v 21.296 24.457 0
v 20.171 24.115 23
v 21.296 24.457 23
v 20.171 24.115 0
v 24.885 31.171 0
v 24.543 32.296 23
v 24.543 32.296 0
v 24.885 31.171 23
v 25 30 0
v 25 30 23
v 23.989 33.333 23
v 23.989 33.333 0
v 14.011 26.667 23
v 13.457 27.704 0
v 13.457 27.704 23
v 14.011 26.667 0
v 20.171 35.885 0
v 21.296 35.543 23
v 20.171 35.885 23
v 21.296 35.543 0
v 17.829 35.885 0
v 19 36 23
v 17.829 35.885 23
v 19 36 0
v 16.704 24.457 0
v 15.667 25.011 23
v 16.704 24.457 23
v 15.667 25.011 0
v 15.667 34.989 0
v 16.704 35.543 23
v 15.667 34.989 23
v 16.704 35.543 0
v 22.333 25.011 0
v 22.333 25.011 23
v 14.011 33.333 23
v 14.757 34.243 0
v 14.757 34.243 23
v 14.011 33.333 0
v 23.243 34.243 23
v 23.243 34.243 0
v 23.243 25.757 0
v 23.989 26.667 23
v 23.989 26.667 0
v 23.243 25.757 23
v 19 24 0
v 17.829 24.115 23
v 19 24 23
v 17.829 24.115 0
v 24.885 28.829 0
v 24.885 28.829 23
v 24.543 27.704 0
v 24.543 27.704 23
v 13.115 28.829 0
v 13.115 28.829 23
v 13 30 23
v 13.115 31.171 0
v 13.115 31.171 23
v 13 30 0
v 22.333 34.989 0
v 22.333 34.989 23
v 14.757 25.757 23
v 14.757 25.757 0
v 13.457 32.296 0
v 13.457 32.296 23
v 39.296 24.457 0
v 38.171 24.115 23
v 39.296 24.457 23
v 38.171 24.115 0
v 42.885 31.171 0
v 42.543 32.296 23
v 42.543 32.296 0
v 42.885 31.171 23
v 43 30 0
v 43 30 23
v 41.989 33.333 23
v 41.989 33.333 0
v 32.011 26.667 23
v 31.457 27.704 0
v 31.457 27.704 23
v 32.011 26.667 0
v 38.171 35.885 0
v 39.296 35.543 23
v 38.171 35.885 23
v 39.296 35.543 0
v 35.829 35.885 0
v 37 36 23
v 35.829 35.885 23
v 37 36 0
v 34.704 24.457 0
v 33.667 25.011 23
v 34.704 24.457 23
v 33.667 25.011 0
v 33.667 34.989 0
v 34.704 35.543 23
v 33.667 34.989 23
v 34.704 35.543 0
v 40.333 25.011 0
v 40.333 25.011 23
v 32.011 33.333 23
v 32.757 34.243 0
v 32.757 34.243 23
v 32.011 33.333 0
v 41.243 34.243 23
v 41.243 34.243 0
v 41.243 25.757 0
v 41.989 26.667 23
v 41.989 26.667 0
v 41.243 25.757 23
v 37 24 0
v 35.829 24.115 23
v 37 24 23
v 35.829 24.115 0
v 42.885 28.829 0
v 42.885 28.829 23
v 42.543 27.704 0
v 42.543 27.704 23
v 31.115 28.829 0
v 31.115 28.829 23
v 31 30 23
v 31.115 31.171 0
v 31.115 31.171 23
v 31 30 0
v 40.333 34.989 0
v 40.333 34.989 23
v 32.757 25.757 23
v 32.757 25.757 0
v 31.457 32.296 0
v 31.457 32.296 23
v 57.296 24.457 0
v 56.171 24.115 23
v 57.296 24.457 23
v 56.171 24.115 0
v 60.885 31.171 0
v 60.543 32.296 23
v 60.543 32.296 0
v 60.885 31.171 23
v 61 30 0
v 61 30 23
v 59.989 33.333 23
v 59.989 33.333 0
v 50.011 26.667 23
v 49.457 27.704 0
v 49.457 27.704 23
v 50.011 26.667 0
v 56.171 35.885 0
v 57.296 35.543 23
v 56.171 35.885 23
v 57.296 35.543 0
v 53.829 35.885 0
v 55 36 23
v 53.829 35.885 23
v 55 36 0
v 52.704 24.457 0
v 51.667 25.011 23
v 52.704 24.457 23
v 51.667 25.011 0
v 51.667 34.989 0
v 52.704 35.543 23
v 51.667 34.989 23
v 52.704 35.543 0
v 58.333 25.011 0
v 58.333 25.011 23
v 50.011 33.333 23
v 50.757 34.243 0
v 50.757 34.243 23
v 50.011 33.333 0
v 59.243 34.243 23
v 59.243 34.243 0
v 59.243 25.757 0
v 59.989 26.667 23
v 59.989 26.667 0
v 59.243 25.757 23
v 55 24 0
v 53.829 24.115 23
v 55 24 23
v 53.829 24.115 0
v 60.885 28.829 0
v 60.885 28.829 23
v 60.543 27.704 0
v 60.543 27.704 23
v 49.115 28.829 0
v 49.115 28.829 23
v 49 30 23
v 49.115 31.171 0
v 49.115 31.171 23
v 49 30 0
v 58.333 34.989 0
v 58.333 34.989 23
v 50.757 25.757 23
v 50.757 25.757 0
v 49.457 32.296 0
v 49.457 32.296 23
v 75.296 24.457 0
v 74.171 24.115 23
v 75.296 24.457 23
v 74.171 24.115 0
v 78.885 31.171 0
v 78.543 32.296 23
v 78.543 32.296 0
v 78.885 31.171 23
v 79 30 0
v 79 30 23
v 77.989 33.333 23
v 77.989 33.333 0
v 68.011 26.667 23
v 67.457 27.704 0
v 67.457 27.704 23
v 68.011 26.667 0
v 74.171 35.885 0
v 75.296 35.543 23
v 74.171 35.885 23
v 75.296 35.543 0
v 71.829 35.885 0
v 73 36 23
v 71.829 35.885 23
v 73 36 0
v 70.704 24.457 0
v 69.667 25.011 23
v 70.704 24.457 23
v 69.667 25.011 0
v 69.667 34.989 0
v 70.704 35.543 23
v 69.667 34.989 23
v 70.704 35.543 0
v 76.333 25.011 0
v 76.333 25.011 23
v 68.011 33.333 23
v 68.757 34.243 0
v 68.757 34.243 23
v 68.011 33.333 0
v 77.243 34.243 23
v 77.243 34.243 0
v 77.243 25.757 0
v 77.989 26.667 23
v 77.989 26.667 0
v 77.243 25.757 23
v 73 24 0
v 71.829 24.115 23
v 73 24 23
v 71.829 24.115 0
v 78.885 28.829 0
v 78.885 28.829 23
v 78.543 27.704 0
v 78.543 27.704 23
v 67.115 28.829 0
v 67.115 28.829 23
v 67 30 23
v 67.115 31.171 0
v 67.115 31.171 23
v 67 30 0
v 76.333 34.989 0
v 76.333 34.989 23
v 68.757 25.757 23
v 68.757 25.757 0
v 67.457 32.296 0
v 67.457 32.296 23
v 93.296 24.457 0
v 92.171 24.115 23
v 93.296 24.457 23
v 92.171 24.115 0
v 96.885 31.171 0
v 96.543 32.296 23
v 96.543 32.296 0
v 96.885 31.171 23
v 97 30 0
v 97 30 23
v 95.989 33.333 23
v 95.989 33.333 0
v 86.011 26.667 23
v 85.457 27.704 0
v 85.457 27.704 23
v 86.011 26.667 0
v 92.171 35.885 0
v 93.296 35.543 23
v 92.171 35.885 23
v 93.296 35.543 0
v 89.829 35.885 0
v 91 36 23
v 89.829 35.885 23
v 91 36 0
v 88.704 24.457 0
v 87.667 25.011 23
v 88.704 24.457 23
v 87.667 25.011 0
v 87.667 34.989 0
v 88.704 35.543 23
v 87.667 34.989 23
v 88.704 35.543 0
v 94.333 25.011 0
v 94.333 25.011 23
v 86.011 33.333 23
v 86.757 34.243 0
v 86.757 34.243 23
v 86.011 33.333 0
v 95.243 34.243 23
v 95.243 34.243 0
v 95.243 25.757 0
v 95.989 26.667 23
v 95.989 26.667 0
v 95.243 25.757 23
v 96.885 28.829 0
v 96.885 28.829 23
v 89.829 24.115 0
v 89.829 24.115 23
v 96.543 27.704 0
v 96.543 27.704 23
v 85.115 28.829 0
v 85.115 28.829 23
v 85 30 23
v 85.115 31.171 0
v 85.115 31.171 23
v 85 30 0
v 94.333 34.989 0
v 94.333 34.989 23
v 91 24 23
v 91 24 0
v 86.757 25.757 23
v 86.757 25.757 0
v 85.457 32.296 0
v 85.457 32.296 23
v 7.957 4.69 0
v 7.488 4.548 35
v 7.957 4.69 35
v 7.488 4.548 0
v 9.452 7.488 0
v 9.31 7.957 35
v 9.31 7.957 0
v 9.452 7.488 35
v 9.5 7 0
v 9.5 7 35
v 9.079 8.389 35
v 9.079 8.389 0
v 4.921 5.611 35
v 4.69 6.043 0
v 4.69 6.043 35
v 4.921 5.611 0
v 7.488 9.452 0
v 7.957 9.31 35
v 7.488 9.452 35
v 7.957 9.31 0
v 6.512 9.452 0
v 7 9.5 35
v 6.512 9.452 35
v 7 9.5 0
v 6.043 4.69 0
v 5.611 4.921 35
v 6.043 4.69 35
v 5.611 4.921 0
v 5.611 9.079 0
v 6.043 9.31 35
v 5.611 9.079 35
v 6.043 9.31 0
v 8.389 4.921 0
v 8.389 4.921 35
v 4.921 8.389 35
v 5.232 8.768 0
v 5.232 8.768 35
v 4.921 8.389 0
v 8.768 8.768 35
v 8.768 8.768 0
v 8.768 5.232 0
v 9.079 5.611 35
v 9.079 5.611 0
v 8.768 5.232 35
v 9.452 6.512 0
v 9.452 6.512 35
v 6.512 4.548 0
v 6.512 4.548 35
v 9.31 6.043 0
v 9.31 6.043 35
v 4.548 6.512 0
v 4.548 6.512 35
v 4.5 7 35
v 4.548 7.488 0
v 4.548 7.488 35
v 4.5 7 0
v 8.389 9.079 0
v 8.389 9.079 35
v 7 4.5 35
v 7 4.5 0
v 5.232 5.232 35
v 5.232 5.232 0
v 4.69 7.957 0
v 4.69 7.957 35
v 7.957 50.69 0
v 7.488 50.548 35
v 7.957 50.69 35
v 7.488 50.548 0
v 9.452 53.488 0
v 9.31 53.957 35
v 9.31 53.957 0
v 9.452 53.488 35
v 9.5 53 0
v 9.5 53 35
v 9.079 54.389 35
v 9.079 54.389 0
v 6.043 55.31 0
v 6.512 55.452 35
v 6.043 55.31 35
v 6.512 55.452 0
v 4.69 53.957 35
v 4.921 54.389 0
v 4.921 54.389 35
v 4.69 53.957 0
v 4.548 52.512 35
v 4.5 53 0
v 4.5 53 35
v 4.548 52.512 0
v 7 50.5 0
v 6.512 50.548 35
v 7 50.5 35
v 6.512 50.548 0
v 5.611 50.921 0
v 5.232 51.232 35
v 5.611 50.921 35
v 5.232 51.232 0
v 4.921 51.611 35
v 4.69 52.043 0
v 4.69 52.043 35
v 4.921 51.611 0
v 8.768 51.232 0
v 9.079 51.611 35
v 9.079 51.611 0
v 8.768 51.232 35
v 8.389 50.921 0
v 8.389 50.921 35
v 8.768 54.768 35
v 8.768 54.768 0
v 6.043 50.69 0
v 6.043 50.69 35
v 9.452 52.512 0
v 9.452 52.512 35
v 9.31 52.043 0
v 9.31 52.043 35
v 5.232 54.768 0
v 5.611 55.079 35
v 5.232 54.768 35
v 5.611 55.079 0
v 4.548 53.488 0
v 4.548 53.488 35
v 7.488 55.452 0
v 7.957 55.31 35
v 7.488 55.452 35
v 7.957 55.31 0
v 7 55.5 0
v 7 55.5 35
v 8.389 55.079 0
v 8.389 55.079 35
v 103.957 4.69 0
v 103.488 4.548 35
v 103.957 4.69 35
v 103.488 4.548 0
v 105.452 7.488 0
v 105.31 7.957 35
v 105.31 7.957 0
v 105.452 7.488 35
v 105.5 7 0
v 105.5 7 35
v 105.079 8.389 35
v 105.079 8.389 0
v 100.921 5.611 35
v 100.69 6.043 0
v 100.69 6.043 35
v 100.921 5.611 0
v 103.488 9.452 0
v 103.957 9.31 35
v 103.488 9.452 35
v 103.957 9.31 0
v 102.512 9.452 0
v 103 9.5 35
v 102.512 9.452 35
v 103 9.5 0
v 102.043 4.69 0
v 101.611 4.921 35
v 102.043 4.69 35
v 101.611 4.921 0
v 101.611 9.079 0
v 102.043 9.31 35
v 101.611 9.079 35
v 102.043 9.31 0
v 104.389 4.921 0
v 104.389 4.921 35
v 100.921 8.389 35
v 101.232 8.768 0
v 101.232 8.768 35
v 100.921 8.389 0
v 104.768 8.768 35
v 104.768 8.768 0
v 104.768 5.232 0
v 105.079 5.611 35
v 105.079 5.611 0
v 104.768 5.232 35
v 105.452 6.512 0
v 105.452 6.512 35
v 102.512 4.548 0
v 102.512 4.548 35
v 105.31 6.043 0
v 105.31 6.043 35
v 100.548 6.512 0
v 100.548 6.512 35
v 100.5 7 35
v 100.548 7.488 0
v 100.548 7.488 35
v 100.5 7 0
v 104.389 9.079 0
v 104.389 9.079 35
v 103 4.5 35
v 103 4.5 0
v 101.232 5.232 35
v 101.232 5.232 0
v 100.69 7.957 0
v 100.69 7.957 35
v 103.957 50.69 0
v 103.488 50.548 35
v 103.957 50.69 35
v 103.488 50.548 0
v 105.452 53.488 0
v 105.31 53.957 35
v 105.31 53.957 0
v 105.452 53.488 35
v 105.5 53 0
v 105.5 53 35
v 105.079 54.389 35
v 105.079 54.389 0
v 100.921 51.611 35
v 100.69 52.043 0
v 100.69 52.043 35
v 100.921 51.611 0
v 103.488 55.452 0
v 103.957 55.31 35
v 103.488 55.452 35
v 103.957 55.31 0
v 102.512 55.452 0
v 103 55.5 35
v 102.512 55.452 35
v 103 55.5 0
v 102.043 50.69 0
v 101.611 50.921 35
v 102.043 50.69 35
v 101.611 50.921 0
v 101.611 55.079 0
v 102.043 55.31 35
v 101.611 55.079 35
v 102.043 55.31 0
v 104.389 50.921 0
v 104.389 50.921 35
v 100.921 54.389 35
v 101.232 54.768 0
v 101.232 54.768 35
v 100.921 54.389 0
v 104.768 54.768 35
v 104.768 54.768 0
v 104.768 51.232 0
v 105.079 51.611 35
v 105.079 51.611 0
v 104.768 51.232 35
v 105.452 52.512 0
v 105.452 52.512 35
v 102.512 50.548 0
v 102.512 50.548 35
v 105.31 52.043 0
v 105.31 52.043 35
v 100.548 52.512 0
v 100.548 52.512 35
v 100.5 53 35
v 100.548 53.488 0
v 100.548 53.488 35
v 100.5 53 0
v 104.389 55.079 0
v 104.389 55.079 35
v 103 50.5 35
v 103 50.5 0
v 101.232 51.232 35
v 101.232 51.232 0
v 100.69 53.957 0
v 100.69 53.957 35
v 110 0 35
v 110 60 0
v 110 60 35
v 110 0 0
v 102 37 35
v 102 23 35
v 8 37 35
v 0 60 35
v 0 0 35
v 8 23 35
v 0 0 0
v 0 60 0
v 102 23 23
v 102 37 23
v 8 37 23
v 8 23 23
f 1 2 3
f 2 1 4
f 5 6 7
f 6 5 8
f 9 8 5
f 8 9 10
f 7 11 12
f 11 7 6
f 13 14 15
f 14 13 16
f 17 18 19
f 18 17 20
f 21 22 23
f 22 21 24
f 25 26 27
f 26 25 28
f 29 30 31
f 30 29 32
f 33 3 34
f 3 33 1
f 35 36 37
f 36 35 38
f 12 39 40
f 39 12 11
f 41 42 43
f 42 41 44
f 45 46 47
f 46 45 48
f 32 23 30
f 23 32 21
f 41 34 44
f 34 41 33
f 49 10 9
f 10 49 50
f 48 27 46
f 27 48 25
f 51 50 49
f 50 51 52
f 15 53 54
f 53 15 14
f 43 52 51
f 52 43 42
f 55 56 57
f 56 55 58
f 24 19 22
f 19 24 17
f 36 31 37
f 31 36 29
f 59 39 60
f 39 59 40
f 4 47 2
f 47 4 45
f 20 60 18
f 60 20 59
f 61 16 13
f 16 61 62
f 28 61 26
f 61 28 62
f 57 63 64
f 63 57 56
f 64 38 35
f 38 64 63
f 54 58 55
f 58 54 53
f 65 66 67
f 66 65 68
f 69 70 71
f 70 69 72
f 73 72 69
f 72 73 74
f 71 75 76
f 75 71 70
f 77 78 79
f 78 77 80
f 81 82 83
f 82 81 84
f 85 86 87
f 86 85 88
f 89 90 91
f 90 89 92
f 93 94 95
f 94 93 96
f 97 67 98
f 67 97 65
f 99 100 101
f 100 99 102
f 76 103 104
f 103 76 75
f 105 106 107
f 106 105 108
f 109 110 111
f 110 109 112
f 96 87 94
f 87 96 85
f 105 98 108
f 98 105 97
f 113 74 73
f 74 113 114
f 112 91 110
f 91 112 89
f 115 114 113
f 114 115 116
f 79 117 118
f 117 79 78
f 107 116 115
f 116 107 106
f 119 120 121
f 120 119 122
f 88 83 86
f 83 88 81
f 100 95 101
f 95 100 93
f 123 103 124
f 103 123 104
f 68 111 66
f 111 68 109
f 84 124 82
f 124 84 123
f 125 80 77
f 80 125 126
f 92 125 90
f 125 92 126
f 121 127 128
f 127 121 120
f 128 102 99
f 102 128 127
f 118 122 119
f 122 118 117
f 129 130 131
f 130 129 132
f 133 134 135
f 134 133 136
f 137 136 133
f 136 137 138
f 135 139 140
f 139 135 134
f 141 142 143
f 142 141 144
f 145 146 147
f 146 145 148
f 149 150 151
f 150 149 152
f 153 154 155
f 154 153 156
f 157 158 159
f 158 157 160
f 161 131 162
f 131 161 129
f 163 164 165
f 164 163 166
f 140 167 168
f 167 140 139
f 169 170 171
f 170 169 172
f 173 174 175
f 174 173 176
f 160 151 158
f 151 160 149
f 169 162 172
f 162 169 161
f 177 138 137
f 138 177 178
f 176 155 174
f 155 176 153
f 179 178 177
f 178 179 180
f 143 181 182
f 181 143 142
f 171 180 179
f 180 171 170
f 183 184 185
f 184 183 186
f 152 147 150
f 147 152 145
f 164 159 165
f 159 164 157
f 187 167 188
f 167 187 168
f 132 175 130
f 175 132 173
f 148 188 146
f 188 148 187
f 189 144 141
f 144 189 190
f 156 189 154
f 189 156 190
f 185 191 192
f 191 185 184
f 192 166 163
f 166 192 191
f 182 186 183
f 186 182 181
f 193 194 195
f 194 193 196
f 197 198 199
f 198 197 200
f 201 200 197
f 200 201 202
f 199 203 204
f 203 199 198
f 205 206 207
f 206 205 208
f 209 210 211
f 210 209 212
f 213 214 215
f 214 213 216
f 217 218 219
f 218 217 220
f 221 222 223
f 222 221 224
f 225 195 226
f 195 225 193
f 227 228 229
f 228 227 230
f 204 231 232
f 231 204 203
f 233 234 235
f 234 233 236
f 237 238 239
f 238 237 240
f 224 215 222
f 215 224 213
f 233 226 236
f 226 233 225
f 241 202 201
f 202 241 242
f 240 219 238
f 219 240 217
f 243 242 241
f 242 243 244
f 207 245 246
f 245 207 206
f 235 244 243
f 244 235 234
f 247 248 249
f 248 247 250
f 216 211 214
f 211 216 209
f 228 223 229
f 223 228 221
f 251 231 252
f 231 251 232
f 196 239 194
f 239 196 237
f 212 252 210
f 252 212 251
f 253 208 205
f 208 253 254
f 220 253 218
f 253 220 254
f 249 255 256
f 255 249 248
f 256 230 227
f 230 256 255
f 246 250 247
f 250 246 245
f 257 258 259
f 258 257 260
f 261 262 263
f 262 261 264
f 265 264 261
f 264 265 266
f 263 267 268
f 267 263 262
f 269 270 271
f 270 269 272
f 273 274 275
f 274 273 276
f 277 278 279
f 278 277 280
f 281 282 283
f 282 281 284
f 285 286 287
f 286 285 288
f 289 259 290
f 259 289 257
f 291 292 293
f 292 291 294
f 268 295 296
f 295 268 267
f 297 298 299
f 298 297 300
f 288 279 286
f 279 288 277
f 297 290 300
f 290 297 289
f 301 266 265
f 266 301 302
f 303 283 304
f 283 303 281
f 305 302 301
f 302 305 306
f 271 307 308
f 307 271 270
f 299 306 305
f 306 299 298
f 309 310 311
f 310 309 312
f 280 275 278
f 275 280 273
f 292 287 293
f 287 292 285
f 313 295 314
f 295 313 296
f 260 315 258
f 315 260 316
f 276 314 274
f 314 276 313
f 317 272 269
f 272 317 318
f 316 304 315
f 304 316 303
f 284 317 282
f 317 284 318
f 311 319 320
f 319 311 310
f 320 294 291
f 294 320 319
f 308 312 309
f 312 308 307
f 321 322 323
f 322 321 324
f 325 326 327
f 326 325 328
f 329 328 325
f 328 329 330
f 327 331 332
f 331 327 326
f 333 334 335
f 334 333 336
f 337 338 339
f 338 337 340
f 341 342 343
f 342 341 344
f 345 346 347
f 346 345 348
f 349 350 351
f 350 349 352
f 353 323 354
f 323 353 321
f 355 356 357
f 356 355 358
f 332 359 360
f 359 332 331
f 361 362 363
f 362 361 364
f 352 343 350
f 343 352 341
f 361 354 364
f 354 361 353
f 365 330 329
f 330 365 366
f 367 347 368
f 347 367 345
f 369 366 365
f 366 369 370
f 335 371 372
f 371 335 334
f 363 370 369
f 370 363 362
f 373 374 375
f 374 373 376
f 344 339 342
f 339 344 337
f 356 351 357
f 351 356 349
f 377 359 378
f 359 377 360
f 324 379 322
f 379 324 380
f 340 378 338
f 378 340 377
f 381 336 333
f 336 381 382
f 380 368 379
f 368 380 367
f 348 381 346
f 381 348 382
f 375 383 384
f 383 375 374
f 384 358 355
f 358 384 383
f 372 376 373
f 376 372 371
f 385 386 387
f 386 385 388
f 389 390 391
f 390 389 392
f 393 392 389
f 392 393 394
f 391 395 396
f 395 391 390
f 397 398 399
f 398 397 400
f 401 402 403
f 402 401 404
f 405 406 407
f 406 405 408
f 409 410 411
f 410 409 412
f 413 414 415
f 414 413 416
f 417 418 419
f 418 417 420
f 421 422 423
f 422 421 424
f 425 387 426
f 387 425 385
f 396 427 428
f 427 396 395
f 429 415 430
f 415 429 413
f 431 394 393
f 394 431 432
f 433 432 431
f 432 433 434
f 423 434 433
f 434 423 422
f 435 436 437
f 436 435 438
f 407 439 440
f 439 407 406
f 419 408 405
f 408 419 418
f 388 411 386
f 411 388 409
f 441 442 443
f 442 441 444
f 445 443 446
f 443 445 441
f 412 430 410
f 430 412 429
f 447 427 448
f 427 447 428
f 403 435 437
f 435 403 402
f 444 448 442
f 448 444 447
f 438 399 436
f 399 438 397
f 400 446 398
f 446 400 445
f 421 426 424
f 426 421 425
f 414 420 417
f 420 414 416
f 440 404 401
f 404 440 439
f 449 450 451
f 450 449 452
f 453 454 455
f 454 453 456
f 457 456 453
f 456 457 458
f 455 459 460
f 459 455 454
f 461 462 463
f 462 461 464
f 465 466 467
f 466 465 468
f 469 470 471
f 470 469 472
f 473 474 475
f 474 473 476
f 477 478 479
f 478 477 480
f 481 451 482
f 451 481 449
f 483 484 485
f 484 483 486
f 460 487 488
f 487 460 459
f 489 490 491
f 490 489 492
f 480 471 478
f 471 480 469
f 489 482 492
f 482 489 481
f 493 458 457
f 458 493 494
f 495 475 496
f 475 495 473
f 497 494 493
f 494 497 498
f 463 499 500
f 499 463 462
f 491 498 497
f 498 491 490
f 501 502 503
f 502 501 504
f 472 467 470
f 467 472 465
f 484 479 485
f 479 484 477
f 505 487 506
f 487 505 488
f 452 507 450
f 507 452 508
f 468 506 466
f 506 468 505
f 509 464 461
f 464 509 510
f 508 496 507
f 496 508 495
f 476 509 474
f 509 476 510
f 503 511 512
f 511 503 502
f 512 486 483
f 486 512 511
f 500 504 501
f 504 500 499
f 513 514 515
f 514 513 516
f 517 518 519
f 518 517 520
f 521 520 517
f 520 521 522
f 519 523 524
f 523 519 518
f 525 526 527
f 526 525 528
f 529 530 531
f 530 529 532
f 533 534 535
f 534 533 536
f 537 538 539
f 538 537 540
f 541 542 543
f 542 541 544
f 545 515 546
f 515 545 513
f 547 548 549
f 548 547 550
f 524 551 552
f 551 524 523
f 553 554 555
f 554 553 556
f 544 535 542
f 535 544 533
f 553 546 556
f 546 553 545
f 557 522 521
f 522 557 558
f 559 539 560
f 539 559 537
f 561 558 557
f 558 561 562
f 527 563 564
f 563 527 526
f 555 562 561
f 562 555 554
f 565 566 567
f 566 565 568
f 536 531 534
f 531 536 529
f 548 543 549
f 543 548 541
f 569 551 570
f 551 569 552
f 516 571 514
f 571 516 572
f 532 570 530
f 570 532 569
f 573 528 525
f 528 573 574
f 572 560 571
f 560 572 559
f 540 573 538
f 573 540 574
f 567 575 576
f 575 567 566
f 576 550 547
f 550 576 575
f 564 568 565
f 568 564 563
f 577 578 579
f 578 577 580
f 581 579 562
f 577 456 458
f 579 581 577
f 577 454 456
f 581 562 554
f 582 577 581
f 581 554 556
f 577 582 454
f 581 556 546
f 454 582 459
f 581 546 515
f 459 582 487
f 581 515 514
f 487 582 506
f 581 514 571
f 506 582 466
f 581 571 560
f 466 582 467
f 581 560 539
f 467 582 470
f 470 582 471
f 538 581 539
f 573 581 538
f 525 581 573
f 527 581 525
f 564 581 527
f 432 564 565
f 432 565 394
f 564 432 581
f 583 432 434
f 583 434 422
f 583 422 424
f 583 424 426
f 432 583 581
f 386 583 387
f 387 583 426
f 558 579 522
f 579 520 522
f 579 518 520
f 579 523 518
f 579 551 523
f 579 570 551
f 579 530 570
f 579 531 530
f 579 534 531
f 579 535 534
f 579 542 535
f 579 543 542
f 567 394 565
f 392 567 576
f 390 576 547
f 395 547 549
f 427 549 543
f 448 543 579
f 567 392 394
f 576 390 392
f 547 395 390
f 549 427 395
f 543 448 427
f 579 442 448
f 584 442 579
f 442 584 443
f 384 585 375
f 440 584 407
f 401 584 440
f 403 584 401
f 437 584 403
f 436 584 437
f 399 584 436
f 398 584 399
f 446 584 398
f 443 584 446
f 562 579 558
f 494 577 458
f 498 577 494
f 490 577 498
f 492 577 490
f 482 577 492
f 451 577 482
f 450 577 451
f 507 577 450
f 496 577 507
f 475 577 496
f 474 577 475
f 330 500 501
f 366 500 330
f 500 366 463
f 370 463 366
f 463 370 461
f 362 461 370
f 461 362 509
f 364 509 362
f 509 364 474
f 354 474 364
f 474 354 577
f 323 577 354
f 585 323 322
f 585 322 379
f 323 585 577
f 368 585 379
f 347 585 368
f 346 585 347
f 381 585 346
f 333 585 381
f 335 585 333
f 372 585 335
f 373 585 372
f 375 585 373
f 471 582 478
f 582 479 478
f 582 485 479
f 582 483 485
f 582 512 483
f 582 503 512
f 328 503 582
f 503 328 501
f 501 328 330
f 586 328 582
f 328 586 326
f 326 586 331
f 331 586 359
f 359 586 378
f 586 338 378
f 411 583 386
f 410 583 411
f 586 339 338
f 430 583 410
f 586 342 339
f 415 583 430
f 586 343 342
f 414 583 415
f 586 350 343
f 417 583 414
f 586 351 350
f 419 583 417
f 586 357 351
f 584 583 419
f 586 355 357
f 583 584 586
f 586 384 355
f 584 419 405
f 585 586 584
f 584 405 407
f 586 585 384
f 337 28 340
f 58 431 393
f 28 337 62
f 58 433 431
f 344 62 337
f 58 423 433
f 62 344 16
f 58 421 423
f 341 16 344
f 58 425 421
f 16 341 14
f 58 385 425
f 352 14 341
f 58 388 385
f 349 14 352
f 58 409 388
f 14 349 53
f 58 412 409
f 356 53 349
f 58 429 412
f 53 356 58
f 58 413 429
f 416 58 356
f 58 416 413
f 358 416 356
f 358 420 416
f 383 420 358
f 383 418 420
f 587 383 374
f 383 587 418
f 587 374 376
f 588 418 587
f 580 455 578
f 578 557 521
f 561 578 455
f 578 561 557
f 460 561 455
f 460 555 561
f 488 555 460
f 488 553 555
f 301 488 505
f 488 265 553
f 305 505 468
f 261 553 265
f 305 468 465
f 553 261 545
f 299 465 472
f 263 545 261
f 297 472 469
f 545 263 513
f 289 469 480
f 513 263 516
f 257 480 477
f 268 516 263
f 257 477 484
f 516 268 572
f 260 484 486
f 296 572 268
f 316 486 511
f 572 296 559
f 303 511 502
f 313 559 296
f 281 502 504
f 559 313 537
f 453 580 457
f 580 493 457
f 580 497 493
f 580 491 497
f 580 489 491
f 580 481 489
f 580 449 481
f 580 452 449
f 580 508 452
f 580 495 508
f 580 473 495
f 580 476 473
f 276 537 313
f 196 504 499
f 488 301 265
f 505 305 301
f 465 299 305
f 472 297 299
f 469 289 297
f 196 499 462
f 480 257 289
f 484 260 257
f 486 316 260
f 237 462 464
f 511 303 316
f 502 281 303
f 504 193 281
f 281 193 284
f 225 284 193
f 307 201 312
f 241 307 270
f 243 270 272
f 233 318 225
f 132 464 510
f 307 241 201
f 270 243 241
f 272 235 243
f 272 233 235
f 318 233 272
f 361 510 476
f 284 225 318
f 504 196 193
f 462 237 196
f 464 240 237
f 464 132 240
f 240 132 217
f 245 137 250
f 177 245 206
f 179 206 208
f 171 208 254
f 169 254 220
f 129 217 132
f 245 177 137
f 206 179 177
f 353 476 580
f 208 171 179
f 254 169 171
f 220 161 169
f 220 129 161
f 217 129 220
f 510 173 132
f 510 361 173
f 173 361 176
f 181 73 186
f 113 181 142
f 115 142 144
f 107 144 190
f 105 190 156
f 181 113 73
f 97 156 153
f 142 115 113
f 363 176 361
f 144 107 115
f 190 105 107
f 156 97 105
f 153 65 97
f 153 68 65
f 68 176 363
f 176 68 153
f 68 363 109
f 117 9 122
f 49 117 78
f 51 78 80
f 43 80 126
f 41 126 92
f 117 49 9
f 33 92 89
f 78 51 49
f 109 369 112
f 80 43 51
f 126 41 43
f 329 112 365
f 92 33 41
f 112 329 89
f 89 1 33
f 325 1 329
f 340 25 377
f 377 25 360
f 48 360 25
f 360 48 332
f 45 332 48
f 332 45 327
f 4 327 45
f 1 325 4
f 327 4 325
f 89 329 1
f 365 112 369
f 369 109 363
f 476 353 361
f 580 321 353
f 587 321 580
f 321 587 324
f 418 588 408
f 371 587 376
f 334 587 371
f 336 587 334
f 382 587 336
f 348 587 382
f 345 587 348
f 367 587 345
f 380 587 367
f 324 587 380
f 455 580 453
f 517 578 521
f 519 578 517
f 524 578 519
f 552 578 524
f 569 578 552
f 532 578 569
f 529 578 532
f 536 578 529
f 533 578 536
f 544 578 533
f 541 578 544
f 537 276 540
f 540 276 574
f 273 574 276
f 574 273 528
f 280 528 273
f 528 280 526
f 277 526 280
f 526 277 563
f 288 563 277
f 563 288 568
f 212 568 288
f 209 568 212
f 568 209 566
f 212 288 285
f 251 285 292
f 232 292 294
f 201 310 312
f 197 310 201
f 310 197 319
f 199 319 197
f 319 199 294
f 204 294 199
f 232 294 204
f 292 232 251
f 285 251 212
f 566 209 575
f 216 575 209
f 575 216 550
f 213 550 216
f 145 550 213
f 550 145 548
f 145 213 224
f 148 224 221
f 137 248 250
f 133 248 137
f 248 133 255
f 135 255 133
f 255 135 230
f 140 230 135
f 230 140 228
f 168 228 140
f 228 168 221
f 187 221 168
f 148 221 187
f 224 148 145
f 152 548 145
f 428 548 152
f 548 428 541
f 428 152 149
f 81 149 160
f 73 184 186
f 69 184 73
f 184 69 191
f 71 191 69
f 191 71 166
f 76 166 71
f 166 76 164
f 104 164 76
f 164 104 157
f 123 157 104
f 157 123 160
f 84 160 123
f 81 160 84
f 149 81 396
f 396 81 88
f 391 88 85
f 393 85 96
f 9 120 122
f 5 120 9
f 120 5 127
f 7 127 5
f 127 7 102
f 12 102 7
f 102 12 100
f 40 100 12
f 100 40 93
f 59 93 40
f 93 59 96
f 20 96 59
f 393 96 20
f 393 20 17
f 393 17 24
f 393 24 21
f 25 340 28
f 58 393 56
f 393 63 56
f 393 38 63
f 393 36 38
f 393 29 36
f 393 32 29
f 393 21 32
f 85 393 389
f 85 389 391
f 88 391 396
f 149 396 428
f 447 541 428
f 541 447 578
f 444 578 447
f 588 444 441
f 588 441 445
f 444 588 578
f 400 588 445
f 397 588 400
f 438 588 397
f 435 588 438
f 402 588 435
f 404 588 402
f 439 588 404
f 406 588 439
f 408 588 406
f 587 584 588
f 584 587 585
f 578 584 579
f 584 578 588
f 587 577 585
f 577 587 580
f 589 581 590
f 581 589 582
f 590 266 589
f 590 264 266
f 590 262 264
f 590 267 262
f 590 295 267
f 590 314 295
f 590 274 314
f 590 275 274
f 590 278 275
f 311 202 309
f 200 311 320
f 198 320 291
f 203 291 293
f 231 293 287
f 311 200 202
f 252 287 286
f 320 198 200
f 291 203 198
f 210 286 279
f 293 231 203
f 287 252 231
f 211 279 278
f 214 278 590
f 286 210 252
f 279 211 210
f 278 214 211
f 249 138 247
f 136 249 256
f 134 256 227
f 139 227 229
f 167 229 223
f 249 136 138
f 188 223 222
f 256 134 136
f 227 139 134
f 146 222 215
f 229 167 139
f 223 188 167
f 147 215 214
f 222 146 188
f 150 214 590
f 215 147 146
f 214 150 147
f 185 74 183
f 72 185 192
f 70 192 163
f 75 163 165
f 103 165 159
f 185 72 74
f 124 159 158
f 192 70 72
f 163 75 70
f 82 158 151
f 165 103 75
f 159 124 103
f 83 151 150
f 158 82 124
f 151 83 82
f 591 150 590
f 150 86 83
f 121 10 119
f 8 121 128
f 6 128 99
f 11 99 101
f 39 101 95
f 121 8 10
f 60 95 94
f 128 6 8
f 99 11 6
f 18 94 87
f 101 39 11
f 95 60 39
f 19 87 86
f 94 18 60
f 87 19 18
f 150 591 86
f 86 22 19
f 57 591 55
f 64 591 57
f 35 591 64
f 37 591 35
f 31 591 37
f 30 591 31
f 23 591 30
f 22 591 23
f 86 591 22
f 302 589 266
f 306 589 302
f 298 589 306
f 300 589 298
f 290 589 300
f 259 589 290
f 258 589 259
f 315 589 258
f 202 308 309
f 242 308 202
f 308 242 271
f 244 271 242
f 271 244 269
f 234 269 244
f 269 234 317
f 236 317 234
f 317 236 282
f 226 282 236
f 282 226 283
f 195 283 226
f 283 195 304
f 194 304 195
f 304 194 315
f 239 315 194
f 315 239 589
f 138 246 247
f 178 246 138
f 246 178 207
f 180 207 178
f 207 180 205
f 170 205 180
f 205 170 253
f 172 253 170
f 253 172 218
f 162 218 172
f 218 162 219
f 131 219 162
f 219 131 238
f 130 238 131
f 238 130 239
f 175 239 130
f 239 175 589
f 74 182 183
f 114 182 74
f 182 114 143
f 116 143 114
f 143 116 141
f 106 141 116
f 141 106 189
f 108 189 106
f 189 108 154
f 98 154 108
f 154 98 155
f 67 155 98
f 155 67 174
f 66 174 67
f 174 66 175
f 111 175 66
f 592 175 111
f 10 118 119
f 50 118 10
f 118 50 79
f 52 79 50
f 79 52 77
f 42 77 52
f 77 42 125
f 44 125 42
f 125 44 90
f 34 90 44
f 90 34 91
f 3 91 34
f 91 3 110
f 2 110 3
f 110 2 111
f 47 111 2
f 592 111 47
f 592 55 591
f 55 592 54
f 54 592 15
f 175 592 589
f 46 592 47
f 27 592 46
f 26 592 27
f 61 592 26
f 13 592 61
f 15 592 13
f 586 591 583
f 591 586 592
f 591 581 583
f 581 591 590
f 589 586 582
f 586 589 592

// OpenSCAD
$fn = 32;

// ----------------------------------------------------------------------
// Manifold block: gallery_top manifold
// ----------------------------------------------------------------------

// --- parameters (mm) ---
block_l = 110;            // block length, X
block_w = 60;             // block width, Y
block_h = 35;             // block height, Z
port_d = 12;              // port bore diameter
port_pitch = 18;          // port pitch along X
gallery_d = 14;           // top gallery width, Y
gallery_depth = 12;       // gallery pocket depth
wall_p = 8;               // gallery end wall thickness, X
mnt_d = 5;                // mounting hole diameter
mnt_in = 7;               // mounting hole inset from the edges
fit_tol = 0.1;            // tolerance for press fits, mm
free_tol = 0.3;           // tolerance for clearance fits, mm

n_ports = 5;  // ports in the row
port_x0 = (block_l - (n_ports - 1) * port_pitch) / 2;  // first port X

difference() {
  cube([block_l, block_w, block_h]);
  for (i = [0 : n_ports - 1])
    translate([port_x0 + i * port_pitch, block_w / 2, -1])
      cylinder(h = block_h + 2, d = port_d);
  translate([wall_p, block_w / 2 - gallery_d / 2, block_h - gallery_depth])
    cube([block_l - 2 * wall_p, gallery_d, gallery_depth + 1]);
  for (cx = [mnt_in, block_l - mnt_in])
    for (cy = [mnt_in, block_w - mnt_in])
      translate([cx, cy, -1]) cylinder(h = block_h + 2, d = mnt_d);
}
